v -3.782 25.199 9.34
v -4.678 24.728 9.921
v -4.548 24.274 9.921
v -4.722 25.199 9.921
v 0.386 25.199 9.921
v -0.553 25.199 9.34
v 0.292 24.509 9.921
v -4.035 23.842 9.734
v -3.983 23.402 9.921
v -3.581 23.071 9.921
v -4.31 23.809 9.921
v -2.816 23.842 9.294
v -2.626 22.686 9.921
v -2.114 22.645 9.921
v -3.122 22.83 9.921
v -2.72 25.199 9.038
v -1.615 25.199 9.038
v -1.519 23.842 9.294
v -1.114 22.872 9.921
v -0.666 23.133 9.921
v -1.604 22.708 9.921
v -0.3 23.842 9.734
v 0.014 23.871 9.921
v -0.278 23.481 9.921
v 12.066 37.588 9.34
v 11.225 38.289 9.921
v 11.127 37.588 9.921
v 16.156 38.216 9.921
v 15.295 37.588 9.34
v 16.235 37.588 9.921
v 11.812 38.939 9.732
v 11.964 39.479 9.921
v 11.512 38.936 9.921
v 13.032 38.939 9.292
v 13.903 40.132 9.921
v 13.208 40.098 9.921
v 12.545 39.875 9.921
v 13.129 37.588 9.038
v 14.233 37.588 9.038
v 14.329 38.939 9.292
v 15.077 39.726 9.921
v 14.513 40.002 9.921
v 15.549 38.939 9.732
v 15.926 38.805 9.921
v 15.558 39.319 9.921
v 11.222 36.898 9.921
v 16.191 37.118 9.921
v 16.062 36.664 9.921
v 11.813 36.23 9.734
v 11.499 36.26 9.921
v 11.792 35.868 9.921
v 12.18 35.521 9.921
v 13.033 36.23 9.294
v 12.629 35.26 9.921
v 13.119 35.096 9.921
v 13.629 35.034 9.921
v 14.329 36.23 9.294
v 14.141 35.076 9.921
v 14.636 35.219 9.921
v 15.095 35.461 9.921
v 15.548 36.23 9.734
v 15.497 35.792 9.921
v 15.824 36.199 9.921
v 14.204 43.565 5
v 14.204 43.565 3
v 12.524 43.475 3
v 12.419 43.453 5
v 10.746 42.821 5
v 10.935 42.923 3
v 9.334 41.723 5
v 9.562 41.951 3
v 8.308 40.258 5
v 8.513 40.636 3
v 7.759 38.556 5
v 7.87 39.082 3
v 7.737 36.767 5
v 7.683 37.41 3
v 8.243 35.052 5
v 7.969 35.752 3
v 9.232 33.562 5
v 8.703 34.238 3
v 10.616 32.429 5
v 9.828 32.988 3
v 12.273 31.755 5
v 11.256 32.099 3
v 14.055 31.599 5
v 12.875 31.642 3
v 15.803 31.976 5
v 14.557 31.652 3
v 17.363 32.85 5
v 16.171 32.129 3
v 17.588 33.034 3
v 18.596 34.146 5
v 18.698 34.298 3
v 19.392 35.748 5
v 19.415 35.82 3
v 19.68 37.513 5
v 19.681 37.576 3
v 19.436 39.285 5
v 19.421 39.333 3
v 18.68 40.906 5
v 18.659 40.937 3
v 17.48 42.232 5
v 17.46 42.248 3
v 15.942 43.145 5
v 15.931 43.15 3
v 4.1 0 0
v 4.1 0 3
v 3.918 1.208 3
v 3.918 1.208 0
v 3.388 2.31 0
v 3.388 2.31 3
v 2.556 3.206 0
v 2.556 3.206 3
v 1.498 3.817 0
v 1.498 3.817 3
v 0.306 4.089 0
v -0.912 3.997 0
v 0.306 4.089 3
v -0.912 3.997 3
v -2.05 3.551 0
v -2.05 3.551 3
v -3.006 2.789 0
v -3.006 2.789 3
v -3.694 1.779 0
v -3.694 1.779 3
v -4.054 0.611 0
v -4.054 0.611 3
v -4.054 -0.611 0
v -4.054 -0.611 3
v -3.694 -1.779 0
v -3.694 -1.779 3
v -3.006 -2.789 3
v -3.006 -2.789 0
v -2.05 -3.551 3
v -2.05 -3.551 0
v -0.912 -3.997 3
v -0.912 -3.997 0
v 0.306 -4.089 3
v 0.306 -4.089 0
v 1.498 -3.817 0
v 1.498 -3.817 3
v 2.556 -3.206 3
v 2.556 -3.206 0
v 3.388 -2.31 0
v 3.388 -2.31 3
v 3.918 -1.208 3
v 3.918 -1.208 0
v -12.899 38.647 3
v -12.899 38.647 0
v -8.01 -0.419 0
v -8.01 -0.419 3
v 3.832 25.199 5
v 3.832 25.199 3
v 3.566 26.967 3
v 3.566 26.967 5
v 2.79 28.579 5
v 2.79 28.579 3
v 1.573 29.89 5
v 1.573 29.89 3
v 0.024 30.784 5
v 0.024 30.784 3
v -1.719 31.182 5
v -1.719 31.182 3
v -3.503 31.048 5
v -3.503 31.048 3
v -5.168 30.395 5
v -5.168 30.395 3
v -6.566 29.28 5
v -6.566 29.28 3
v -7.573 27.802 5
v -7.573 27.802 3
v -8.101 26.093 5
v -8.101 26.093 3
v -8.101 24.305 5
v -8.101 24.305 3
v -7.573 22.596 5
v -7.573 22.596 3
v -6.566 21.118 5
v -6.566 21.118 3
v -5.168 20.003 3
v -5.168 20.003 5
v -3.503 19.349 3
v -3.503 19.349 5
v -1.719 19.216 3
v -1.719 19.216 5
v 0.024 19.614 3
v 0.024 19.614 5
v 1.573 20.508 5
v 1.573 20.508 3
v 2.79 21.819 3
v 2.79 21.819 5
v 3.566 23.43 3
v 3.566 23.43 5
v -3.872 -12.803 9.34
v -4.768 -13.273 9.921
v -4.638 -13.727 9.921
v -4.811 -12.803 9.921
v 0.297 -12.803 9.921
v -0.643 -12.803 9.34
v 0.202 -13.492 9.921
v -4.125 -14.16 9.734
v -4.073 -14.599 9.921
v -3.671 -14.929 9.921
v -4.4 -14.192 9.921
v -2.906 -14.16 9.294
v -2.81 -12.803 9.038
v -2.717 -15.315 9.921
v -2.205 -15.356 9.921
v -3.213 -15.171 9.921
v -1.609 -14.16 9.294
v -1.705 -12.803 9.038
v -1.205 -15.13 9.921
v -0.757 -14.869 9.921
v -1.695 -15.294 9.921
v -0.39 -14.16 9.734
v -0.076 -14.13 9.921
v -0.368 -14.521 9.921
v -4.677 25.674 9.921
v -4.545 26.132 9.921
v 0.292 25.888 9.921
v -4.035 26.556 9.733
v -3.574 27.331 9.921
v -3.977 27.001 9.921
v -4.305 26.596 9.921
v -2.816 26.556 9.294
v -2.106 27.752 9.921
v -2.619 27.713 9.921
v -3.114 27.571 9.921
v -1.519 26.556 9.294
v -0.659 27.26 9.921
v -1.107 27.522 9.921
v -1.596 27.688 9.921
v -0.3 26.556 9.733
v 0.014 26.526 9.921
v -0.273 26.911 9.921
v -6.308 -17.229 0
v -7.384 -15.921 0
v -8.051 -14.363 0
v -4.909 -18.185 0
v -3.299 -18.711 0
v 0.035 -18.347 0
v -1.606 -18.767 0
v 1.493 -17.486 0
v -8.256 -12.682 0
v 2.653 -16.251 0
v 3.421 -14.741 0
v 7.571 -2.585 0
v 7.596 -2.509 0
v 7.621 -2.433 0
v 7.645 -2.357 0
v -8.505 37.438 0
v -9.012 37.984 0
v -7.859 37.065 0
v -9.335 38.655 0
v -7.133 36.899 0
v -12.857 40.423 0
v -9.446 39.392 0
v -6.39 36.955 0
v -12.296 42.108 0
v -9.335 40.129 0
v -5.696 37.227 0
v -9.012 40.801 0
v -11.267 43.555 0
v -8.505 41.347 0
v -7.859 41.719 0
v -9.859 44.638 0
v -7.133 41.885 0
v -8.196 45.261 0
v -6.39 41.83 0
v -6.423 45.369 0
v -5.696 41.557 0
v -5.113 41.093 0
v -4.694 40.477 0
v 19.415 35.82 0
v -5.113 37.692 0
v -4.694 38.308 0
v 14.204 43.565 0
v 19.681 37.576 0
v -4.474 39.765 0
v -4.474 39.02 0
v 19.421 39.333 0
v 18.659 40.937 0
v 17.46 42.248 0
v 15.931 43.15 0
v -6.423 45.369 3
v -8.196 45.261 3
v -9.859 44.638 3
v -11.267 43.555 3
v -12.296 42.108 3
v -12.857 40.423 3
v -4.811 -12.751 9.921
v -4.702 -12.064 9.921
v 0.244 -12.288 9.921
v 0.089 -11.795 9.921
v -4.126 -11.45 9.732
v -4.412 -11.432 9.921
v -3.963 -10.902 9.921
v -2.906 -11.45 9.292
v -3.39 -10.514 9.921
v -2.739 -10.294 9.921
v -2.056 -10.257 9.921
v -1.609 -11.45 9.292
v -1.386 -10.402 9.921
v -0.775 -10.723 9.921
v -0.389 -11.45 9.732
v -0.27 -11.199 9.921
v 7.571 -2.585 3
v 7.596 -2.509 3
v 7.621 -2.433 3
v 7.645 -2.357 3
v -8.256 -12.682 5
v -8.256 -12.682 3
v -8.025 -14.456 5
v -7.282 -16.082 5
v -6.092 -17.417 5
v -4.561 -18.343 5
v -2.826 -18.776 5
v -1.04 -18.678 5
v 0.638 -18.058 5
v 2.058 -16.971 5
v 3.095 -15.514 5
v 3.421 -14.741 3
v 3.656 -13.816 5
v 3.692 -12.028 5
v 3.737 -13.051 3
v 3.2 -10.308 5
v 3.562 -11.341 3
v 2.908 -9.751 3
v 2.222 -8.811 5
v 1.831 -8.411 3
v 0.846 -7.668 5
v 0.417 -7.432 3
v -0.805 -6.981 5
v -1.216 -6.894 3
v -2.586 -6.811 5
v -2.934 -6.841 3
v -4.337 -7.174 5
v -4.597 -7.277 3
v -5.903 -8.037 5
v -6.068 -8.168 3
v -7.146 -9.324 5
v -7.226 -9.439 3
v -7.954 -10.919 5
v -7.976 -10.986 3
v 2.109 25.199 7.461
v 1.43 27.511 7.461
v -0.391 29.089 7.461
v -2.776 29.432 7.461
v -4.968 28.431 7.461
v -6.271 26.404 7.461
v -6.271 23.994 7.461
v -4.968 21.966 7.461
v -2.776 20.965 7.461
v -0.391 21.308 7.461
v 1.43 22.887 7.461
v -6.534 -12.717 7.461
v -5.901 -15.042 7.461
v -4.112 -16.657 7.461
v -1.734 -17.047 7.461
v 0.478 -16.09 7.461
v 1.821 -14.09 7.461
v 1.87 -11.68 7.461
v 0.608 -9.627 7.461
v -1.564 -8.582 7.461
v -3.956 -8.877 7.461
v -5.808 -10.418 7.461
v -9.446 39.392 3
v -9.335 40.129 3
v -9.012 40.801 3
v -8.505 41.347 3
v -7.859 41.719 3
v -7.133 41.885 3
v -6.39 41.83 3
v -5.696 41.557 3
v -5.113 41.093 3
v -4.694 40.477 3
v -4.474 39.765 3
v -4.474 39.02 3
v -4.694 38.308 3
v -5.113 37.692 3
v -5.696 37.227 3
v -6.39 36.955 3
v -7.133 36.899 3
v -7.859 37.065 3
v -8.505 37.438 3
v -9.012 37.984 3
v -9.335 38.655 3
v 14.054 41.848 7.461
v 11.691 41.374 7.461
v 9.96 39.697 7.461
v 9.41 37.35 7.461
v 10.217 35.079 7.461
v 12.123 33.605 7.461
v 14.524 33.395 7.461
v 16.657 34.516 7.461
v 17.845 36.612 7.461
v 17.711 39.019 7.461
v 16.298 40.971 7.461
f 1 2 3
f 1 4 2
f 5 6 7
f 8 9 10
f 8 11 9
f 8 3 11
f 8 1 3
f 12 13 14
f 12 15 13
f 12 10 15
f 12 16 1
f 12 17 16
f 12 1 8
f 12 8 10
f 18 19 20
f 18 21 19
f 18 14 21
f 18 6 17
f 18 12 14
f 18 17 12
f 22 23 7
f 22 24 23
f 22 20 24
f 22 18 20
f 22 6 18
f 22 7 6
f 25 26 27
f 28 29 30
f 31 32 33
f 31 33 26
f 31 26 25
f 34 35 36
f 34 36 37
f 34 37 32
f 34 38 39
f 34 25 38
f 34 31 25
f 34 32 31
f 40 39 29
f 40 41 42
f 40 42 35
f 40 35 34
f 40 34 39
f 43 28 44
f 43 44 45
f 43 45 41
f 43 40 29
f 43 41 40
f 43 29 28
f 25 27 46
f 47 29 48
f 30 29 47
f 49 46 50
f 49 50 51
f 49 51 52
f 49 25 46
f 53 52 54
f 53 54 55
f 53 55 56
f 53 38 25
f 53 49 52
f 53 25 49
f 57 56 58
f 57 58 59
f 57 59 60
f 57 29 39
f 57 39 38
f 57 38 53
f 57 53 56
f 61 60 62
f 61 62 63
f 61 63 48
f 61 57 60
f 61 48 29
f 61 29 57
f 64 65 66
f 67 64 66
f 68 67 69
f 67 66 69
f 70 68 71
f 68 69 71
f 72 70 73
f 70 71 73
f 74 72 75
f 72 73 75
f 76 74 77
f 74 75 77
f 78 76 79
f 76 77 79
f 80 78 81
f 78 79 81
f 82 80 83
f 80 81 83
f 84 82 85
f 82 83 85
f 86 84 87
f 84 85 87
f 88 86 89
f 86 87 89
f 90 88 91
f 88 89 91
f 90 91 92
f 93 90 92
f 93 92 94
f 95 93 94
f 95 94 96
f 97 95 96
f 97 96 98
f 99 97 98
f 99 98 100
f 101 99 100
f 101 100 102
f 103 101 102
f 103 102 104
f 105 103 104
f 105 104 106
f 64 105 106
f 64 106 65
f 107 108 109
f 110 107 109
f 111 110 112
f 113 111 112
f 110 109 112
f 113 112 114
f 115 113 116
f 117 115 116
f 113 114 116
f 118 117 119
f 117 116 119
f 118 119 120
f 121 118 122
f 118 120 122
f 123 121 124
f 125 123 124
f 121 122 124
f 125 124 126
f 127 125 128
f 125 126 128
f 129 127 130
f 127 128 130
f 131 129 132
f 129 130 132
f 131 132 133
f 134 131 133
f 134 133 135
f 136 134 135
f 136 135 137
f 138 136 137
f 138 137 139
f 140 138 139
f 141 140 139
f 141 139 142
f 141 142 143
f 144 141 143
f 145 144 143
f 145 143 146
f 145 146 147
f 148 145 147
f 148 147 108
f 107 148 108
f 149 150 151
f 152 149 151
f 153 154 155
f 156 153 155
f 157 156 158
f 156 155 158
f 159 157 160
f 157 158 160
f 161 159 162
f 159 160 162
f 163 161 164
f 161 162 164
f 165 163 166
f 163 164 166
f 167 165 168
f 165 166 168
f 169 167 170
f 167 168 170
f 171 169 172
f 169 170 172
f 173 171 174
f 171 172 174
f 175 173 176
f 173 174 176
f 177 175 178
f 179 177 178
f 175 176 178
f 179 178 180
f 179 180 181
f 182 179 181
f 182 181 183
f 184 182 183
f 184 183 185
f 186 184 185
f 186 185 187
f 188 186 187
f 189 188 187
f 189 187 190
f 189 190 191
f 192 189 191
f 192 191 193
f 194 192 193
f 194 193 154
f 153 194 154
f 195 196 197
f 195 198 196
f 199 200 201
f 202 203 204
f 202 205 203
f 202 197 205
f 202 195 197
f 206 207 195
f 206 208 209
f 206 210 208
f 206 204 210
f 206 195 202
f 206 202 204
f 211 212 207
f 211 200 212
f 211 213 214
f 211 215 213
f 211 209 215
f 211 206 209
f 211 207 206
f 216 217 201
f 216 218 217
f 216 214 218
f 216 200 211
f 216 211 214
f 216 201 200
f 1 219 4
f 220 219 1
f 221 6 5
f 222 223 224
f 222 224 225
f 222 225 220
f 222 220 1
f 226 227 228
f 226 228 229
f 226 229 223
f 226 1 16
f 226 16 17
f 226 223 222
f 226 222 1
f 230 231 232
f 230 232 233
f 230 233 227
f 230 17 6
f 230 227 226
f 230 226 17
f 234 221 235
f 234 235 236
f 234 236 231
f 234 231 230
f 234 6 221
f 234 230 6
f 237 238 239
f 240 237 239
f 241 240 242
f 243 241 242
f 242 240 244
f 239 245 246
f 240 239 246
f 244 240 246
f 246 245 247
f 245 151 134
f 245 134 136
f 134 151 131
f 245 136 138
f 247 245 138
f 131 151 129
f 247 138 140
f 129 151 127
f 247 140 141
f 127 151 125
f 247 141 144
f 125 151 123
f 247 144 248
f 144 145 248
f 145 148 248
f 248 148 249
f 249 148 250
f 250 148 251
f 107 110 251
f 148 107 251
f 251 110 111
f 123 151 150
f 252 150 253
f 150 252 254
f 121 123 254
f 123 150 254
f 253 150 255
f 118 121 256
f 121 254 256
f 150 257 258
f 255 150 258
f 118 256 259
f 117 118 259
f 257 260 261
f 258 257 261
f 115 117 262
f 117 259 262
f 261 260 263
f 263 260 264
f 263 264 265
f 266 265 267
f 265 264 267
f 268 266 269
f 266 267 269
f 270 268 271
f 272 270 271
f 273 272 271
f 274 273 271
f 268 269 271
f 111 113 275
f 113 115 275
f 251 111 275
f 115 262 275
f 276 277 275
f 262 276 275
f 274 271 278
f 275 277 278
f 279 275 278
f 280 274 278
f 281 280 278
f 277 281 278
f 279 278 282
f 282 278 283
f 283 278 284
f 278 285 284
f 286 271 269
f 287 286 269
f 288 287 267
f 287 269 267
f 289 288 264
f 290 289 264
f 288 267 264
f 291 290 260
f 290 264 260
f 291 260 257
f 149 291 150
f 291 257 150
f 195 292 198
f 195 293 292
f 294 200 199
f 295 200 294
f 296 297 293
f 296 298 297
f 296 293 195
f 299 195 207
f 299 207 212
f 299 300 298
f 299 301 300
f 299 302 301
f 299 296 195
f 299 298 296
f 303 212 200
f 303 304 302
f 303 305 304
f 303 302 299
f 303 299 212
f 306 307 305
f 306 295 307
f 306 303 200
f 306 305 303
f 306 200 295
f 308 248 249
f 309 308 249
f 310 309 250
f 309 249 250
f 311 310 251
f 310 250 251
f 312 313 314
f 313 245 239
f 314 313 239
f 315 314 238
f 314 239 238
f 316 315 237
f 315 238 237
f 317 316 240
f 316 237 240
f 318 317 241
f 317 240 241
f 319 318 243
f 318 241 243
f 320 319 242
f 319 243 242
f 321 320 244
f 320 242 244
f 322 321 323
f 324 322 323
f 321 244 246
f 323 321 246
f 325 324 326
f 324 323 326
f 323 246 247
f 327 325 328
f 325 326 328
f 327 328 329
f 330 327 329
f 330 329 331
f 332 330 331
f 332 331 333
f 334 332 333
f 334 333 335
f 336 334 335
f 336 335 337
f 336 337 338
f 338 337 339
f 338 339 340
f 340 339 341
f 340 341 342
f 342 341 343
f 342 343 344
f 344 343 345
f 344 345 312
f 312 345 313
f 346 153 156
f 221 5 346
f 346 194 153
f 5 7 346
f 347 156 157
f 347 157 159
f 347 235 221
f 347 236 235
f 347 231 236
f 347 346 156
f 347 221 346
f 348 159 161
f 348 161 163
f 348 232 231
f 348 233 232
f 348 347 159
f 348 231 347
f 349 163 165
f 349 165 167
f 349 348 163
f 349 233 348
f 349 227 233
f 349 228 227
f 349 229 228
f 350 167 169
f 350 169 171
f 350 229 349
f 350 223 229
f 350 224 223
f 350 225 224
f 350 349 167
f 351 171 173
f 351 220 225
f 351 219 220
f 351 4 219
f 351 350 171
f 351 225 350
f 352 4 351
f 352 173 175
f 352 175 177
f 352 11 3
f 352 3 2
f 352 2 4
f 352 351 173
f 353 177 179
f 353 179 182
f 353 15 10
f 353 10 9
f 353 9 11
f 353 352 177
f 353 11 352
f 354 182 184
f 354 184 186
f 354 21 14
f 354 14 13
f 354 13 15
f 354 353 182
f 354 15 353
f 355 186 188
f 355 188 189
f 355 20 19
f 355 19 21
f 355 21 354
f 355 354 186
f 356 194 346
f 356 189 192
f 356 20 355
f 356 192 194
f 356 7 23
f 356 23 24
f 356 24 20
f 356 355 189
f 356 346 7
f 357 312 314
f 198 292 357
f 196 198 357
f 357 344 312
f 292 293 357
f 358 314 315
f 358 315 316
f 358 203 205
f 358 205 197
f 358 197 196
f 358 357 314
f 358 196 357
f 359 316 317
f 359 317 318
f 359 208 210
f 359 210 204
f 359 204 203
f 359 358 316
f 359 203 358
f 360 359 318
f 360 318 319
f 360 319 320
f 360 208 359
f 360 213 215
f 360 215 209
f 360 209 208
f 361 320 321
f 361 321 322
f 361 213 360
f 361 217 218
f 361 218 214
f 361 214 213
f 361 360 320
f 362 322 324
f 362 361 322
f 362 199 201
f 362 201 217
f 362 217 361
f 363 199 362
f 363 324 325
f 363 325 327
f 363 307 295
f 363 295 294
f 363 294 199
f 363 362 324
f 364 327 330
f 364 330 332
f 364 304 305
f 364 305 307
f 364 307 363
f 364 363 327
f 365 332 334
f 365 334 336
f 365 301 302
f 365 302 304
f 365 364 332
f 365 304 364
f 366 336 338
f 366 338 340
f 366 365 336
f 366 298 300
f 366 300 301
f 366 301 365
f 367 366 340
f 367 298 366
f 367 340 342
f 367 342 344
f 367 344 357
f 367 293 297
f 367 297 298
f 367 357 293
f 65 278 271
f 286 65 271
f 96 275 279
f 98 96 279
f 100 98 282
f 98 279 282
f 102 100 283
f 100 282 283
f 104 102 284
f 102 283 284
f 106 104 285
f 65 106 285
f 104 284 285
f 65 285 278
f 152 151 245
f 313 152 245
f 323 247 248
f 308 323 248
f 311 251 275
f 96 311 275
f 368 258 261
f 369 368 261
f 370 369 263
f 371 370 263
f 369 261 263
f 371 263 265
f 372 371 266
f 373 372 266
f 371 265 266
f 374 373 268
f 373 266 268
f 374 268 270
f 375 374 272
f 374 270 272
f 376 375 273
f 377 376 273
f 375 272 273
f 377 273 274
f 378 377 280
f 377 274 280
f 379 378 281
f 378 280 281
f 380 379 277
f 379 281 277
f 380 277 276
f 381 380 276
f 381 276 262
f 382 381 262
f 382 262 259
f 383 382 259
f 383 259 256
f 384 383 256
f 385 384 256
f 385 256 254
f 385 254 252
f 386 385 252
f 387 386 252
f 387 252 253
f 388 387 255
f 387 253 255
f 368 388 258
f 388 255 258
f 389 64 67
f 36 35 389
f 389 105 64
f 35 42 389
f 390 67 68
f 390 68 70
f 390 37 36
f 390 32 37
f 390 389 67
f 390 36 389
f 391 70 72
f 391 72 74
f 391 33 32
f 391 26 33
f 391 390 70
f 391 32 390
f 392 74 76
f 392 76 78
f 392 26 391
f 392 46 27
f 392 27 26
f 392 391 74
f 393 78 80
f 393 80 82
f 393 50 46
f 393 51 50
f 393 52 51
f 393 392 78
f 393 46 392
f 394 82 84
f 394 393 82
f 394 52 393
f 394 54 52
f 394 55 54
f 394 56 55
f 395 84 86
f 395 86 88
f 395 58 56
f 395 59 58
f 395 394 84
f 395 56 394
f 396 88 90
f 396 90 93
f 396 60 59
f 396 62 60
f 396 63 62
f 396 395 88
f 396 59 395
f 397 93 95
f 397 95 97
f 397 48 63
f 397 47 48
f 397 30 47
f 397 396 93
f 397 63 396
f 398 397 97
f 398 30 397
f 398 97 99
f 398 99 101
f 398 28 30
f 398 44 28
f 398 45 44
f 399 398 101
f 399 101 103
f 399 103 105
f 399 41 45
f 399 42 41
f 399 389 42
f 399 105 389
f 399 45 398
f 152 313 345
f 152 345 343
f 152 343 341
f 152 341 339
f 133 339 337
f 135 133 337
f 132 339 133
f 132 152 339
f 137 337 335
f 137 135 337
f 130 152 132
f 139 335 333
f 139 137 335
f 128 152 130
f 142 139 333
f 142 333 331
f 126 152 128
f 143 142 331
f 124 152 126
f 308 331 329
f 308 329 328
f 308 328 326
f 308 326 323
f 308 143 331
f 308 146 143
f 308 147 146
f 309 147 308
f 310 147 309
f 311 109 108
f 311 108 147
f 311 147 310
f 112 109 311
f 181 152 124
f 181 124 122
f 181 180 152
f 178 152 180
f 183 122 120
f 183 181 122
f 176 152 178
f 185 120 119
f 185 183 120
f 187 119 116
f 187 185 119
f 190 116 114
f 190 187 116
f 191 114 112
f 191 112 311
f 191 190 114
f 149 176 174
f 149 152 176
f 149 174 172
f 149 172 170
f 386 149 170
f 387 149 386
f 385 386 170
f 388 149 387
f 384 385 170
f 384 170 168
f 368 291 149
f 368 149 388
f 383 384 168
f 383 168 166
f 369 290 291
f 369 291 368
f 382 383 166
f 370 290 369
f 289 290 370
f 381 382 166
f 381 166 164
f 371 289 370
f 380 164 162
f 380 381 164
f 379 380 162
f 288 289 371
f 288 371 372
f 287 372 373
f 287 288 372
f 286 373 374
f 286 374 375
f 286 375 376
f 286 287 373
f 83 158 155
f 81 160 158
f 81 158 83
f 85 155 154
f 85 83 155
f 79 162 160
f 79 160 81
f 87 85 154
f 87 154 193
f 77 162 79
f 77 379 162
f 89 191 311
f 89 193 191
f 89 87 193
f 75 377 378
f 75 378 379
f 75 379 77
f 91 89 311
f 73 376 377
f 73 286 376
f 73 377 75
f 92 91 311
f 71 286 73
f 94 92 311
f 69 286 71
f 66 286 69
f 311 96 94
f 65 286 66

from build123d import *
from build123d.topology import SkipClean

# Parameters (mm, degrees)
BOSS_EXTRUDE1_DEPTH = 3
BOSS_EXTRUDE5_DEPTH = 3
BOSS_EXTRUDE2_DEPTH = 3
SKETCH3_R           = 4.1
CUT_EXTRUDE1_DEPTH  = 50
SKETCH1_4_R         = 6
BOSS_EXTRUDE3_DEPTH = 10
SKETCH2_4_R         = 6
BOSS_EXTRUDE4_DEPTH = 10
CHAMFER1_SIZE       = 5
CHAMFER1_SIZE_2     = 3.501037691
SKETCH9_R           = 2.5
CUT_EXTRUDE2_DEPTH  = 3


with BuildPart() as part:
    # Sketch1 → Boss-Extrude1 (new body)
    with BuildSketch(Plane.XY):
        with BuildLine():
            ThreePointArc((-7.862783113, 28.36246747), (-9.674812704, 26.016588816), (-10.142674299, 23.089524856))
            Line((-10.142674299, 23.089524856), (-7.966824047, -0.727814955))
            ThreePointArc((-7.966824047, -0.727814955), (-0.830270862, -7.956798998), (7.644946217, -2.356861757))
            Line((7.644946217, -2.356861757), (19.414515396, 35.820058514))
            ThreePointArc((19.414515396, 35.820058514), (17.084366379, 42.528936958), (9.985578884, 42.314786229))
            Line((9.985578884, 42.314786229), (-7.862783113, 28.36246747))
        make_face()
    extrude(amount=BOSS_EXTRUDE1_DEPTH)

    # Sketch8 → Boss-Extrude5 (add)
    with BuildSketch(Plane.XY):
        with BuildLine():
            Line((14.20374019, 43.56487302), (-6.42299265, 45.369478309))
            ThreePointArc((-6.42299265, 45.369478309), (-11.266837417, 43.555209842), (-12.899477398, 38.647166557))
            Line((-12.899477398, 38.647166557), (-7.938067055, -0.993524752))
            ThreePointArc((-7.938067055, -0.993524752), (-7.953555222, -0.86078995), (-7.966824047, -0.727814955))
            Line((-7.966824047, -0.727814955), (-10.142674299, 23.089524856))
            ThreePointArc((-10.142674299, 23.089524856), (-9.674812704, 26.016588816), (-7.862783113, 28.36246747))
            Line((-7.862783113, 28.36246747), (9.985578884, 42.314786229))
            ThreePointArc((9.985578884, 42.314786229), (11.97594826, 43.340396462), (14.20374019, 43.56487302))
        make_face()
    extrude(amount=BOSS_EXTRUDE5_DEPTH)

    # Sketch2 → Boss-Extrude2 (add)
    with BuildSketch(Plane.XY):
        with BuildLine():
            Line((-7.9983883, 0.16057583), (-8.256217535, -12.682068917))
            ThreePointArc((-8.256217535, -12.682068917), (-3.299315376, -18.711347307), (3.420783665, -14.741039282))
            Line((3.420783665, -14.741039282), (7.570946632, -2.584717991))
            ThreePointArc((7.570946632, -2.584717991), (-1.389185421, -7.878462024), (-7.9983883, 0.16057583))
        make_face()
    extrude(amount=BOSS_EXTRUDE2_DEPTH)

    # Sketch3 → Cut-Extrude1 (cut)
    with BuildSketch(Plane.XY.offset(3)):
        Circle(SKETCH3_R)
    extrude(amount=-CUT_EXTRUDE1_DEPTH, mode=Mode.SUBTRACT)

    # Sketch1<4> → Boss-Extrude3 (add)
    with BuildSketch(Plane.XY):
        with Locations(Location((13.680805733, 37.587704831, 0), (0, 0, 85))):
            Circle(SKETCH1_4_R)
        with Locations((-2.167556264, 25.198814555)):
            Circle(SKETCH1_4_R)
    extrude(amount=BOSS_EXTRUDE3_DEPTH)

    # Sketch2<4> → Boss-Extrude4 (add)
    with BuildSketch(Plane.XY):
        with Locations(Location((-2.25742631, -12.802500789, 0), (0, 0, 178.849883098))):
            Circle(SKETCH2_4_R)
    extrude(amount=BOSS_EXTRUDE4_DEPTH)

    # Sketch5 one side → Cut-Revolve1 (revolve, cut)
    with SkipClean():  # the faces are left unmerged after this step: merging them gives an invalid solid
        with BuildSketch(Plane(origin=(13.680805733, 0, 0), x_dir=(0, 0, -1), z_dir=(1, 0, 0))):
            with BuildLine():
                ThreePointArc((-13, 33.587704831), (-10.171572875, 34.759277707), (-9, 37.587704831))
                ThreePointArc((-9, 37.587704831), (-10.171572875, 40.416131956), (-13, 41.587704831))
                Line((-13, 41.587704831), (-13, 33.587704831))
            make_face()
        revolve(axis=Axis((13.680805733, 41.587704831, 13), (0, -1, 0)), mode=Mode.SUBTRACT)

    # Sketch6 → Cut-Revolve2 (revolve, cut)
    with SkipClean():  # the faces are left unmerged after this step: merging them gives an invalid solid
        with BuildSketch(Plane(origin=(-2.167556264, 0, 0), x_dir=(0, 0, -1), z_dir=(1, 0, 0))):
            with BuildLine():
                ThreePointArc((-9, 25.198814555), (-10.171572875, 28.02724168), (-13, 29.198814555))
                Line((-13, 29.198814555), (-13, 21.198814555))
                ThreePointArc((-13, 21.198814555), (-10.171572875, 22.37038743), (-9, 25.198814555))
            make_face()
            with BuildLine():
                Line((-13, 21.198814555), (-13, 29.198814555))
                ThreePointArc((-13, 29.198814555), (-17, 25.198814555), (-13, 21.198814555))
            make_face()
        revolve(axis=Axis((-2.167556264, 29.198814555, 13), (0, -1, 0)), mode=Mode.SUBTRACT)

    # Sketch7 → Cut-Revolve3 (revolve, cut)
    with SkipClean():  # the faces are left unmerged after this step: merging them gives an invalid solid
        with BuildSketch(Plane(origin=(-2.25742631, 0, 0), x_dir=(0, 0, -1), z_dir=(1, 0, 0))):
            with BuildLine():
                ThreePointArc((-9, -12.802500789), (-10.171572875, -9.974073664), (-13, -8.802500789))
                Line((-13, -8.802500789), (-13, -16.802500789))
                ThreePointArc((-13, -16.802500789), (-10.171572875, -15.630927914), (-9, -12.802500789))
            make_face()
            with BuildLine():
                Line((-13, -16.802500789), (-13, -8.802500789))
                ThreePointArc((-13, -8.802500789), (-17, -12.802500789), (-13, -16.802500789))
            make_face()
        revolve(axis=Axis((-2.25742631, -8.802500789, 13), (0, -1, 0)), mode=Mode.SUBTRACT)

    # Chamfer1
    # the kernel refuses this chamfer: 5, 3.501037691 mm, written as the material it takes off along each edge
    with BuildSketch(Plane(origin=(-2.25742631, -12.802500789, 10), x_dir=(-0.9997985375420249, 0.020071978697384193, 0), z_dir=(0.020071978697384193, 0.9997985375420249, 0))) as chamfer1_piece_1:
        Polygon((6, -CHAMFER1_SIZE), (6 - CHAMFER1_SIZE_2, 0), (6, 0), align=None)
    revolve(axis=Axis((-2.25742631, -12.802500789, 10), (0, 0, 1)), mode=Mode.SUBTRACT)
    with BuildSketch(Plane(origin=(13.680805733, 37.587704831, 10), x_dir=(0.08715574274765815, 0.9961946980917454, 0), z_dir=(0.9961946980917454, -0.08715574274765815, 0))) as chamfer1_piece_2:
        Polygon((6, -CHAMFER1_SIZE), (6 - CHAMFER1_SIZE_2, 0), (6, 0), align=None)
    revolve(axis=Axis((13.680805733, 37.587704831, 10), (0, 0, 1)), mode=Mode.SUBTRACT)
    with BuildSketch(Plane(origin=(-2.167556264, 25.198814555, 10), x_dir=(1, 0, 0), z_dir=(0, -1, 0))) as chamfer1_piece_3:
        Polygon((6, -CHAMFER1_SIZE), (6 - CHAMFER1_SIZE_2, 0), (6, 0), align=None)
    revolve(axis=Axis((-2.167556264, 25.198814555, 10), (0, 0, 1)), mode=Mode.SUBTRACT)

    # Sketch9 → Cut-Extrude2 (cut)
    with BuildSketch(Plane(origin=(0, 0, 0), x_dir=(-1, 0, 0), z_dir=(0, 0, -1))):
        with Locations((6.945927107, 39.39231012)):
            Circle(SKETCH9_R)
    extrude(amount=-CUT_EXTRUDE2_DEPTH, mode=Mode.SUBTRACT)


solid = part.part
